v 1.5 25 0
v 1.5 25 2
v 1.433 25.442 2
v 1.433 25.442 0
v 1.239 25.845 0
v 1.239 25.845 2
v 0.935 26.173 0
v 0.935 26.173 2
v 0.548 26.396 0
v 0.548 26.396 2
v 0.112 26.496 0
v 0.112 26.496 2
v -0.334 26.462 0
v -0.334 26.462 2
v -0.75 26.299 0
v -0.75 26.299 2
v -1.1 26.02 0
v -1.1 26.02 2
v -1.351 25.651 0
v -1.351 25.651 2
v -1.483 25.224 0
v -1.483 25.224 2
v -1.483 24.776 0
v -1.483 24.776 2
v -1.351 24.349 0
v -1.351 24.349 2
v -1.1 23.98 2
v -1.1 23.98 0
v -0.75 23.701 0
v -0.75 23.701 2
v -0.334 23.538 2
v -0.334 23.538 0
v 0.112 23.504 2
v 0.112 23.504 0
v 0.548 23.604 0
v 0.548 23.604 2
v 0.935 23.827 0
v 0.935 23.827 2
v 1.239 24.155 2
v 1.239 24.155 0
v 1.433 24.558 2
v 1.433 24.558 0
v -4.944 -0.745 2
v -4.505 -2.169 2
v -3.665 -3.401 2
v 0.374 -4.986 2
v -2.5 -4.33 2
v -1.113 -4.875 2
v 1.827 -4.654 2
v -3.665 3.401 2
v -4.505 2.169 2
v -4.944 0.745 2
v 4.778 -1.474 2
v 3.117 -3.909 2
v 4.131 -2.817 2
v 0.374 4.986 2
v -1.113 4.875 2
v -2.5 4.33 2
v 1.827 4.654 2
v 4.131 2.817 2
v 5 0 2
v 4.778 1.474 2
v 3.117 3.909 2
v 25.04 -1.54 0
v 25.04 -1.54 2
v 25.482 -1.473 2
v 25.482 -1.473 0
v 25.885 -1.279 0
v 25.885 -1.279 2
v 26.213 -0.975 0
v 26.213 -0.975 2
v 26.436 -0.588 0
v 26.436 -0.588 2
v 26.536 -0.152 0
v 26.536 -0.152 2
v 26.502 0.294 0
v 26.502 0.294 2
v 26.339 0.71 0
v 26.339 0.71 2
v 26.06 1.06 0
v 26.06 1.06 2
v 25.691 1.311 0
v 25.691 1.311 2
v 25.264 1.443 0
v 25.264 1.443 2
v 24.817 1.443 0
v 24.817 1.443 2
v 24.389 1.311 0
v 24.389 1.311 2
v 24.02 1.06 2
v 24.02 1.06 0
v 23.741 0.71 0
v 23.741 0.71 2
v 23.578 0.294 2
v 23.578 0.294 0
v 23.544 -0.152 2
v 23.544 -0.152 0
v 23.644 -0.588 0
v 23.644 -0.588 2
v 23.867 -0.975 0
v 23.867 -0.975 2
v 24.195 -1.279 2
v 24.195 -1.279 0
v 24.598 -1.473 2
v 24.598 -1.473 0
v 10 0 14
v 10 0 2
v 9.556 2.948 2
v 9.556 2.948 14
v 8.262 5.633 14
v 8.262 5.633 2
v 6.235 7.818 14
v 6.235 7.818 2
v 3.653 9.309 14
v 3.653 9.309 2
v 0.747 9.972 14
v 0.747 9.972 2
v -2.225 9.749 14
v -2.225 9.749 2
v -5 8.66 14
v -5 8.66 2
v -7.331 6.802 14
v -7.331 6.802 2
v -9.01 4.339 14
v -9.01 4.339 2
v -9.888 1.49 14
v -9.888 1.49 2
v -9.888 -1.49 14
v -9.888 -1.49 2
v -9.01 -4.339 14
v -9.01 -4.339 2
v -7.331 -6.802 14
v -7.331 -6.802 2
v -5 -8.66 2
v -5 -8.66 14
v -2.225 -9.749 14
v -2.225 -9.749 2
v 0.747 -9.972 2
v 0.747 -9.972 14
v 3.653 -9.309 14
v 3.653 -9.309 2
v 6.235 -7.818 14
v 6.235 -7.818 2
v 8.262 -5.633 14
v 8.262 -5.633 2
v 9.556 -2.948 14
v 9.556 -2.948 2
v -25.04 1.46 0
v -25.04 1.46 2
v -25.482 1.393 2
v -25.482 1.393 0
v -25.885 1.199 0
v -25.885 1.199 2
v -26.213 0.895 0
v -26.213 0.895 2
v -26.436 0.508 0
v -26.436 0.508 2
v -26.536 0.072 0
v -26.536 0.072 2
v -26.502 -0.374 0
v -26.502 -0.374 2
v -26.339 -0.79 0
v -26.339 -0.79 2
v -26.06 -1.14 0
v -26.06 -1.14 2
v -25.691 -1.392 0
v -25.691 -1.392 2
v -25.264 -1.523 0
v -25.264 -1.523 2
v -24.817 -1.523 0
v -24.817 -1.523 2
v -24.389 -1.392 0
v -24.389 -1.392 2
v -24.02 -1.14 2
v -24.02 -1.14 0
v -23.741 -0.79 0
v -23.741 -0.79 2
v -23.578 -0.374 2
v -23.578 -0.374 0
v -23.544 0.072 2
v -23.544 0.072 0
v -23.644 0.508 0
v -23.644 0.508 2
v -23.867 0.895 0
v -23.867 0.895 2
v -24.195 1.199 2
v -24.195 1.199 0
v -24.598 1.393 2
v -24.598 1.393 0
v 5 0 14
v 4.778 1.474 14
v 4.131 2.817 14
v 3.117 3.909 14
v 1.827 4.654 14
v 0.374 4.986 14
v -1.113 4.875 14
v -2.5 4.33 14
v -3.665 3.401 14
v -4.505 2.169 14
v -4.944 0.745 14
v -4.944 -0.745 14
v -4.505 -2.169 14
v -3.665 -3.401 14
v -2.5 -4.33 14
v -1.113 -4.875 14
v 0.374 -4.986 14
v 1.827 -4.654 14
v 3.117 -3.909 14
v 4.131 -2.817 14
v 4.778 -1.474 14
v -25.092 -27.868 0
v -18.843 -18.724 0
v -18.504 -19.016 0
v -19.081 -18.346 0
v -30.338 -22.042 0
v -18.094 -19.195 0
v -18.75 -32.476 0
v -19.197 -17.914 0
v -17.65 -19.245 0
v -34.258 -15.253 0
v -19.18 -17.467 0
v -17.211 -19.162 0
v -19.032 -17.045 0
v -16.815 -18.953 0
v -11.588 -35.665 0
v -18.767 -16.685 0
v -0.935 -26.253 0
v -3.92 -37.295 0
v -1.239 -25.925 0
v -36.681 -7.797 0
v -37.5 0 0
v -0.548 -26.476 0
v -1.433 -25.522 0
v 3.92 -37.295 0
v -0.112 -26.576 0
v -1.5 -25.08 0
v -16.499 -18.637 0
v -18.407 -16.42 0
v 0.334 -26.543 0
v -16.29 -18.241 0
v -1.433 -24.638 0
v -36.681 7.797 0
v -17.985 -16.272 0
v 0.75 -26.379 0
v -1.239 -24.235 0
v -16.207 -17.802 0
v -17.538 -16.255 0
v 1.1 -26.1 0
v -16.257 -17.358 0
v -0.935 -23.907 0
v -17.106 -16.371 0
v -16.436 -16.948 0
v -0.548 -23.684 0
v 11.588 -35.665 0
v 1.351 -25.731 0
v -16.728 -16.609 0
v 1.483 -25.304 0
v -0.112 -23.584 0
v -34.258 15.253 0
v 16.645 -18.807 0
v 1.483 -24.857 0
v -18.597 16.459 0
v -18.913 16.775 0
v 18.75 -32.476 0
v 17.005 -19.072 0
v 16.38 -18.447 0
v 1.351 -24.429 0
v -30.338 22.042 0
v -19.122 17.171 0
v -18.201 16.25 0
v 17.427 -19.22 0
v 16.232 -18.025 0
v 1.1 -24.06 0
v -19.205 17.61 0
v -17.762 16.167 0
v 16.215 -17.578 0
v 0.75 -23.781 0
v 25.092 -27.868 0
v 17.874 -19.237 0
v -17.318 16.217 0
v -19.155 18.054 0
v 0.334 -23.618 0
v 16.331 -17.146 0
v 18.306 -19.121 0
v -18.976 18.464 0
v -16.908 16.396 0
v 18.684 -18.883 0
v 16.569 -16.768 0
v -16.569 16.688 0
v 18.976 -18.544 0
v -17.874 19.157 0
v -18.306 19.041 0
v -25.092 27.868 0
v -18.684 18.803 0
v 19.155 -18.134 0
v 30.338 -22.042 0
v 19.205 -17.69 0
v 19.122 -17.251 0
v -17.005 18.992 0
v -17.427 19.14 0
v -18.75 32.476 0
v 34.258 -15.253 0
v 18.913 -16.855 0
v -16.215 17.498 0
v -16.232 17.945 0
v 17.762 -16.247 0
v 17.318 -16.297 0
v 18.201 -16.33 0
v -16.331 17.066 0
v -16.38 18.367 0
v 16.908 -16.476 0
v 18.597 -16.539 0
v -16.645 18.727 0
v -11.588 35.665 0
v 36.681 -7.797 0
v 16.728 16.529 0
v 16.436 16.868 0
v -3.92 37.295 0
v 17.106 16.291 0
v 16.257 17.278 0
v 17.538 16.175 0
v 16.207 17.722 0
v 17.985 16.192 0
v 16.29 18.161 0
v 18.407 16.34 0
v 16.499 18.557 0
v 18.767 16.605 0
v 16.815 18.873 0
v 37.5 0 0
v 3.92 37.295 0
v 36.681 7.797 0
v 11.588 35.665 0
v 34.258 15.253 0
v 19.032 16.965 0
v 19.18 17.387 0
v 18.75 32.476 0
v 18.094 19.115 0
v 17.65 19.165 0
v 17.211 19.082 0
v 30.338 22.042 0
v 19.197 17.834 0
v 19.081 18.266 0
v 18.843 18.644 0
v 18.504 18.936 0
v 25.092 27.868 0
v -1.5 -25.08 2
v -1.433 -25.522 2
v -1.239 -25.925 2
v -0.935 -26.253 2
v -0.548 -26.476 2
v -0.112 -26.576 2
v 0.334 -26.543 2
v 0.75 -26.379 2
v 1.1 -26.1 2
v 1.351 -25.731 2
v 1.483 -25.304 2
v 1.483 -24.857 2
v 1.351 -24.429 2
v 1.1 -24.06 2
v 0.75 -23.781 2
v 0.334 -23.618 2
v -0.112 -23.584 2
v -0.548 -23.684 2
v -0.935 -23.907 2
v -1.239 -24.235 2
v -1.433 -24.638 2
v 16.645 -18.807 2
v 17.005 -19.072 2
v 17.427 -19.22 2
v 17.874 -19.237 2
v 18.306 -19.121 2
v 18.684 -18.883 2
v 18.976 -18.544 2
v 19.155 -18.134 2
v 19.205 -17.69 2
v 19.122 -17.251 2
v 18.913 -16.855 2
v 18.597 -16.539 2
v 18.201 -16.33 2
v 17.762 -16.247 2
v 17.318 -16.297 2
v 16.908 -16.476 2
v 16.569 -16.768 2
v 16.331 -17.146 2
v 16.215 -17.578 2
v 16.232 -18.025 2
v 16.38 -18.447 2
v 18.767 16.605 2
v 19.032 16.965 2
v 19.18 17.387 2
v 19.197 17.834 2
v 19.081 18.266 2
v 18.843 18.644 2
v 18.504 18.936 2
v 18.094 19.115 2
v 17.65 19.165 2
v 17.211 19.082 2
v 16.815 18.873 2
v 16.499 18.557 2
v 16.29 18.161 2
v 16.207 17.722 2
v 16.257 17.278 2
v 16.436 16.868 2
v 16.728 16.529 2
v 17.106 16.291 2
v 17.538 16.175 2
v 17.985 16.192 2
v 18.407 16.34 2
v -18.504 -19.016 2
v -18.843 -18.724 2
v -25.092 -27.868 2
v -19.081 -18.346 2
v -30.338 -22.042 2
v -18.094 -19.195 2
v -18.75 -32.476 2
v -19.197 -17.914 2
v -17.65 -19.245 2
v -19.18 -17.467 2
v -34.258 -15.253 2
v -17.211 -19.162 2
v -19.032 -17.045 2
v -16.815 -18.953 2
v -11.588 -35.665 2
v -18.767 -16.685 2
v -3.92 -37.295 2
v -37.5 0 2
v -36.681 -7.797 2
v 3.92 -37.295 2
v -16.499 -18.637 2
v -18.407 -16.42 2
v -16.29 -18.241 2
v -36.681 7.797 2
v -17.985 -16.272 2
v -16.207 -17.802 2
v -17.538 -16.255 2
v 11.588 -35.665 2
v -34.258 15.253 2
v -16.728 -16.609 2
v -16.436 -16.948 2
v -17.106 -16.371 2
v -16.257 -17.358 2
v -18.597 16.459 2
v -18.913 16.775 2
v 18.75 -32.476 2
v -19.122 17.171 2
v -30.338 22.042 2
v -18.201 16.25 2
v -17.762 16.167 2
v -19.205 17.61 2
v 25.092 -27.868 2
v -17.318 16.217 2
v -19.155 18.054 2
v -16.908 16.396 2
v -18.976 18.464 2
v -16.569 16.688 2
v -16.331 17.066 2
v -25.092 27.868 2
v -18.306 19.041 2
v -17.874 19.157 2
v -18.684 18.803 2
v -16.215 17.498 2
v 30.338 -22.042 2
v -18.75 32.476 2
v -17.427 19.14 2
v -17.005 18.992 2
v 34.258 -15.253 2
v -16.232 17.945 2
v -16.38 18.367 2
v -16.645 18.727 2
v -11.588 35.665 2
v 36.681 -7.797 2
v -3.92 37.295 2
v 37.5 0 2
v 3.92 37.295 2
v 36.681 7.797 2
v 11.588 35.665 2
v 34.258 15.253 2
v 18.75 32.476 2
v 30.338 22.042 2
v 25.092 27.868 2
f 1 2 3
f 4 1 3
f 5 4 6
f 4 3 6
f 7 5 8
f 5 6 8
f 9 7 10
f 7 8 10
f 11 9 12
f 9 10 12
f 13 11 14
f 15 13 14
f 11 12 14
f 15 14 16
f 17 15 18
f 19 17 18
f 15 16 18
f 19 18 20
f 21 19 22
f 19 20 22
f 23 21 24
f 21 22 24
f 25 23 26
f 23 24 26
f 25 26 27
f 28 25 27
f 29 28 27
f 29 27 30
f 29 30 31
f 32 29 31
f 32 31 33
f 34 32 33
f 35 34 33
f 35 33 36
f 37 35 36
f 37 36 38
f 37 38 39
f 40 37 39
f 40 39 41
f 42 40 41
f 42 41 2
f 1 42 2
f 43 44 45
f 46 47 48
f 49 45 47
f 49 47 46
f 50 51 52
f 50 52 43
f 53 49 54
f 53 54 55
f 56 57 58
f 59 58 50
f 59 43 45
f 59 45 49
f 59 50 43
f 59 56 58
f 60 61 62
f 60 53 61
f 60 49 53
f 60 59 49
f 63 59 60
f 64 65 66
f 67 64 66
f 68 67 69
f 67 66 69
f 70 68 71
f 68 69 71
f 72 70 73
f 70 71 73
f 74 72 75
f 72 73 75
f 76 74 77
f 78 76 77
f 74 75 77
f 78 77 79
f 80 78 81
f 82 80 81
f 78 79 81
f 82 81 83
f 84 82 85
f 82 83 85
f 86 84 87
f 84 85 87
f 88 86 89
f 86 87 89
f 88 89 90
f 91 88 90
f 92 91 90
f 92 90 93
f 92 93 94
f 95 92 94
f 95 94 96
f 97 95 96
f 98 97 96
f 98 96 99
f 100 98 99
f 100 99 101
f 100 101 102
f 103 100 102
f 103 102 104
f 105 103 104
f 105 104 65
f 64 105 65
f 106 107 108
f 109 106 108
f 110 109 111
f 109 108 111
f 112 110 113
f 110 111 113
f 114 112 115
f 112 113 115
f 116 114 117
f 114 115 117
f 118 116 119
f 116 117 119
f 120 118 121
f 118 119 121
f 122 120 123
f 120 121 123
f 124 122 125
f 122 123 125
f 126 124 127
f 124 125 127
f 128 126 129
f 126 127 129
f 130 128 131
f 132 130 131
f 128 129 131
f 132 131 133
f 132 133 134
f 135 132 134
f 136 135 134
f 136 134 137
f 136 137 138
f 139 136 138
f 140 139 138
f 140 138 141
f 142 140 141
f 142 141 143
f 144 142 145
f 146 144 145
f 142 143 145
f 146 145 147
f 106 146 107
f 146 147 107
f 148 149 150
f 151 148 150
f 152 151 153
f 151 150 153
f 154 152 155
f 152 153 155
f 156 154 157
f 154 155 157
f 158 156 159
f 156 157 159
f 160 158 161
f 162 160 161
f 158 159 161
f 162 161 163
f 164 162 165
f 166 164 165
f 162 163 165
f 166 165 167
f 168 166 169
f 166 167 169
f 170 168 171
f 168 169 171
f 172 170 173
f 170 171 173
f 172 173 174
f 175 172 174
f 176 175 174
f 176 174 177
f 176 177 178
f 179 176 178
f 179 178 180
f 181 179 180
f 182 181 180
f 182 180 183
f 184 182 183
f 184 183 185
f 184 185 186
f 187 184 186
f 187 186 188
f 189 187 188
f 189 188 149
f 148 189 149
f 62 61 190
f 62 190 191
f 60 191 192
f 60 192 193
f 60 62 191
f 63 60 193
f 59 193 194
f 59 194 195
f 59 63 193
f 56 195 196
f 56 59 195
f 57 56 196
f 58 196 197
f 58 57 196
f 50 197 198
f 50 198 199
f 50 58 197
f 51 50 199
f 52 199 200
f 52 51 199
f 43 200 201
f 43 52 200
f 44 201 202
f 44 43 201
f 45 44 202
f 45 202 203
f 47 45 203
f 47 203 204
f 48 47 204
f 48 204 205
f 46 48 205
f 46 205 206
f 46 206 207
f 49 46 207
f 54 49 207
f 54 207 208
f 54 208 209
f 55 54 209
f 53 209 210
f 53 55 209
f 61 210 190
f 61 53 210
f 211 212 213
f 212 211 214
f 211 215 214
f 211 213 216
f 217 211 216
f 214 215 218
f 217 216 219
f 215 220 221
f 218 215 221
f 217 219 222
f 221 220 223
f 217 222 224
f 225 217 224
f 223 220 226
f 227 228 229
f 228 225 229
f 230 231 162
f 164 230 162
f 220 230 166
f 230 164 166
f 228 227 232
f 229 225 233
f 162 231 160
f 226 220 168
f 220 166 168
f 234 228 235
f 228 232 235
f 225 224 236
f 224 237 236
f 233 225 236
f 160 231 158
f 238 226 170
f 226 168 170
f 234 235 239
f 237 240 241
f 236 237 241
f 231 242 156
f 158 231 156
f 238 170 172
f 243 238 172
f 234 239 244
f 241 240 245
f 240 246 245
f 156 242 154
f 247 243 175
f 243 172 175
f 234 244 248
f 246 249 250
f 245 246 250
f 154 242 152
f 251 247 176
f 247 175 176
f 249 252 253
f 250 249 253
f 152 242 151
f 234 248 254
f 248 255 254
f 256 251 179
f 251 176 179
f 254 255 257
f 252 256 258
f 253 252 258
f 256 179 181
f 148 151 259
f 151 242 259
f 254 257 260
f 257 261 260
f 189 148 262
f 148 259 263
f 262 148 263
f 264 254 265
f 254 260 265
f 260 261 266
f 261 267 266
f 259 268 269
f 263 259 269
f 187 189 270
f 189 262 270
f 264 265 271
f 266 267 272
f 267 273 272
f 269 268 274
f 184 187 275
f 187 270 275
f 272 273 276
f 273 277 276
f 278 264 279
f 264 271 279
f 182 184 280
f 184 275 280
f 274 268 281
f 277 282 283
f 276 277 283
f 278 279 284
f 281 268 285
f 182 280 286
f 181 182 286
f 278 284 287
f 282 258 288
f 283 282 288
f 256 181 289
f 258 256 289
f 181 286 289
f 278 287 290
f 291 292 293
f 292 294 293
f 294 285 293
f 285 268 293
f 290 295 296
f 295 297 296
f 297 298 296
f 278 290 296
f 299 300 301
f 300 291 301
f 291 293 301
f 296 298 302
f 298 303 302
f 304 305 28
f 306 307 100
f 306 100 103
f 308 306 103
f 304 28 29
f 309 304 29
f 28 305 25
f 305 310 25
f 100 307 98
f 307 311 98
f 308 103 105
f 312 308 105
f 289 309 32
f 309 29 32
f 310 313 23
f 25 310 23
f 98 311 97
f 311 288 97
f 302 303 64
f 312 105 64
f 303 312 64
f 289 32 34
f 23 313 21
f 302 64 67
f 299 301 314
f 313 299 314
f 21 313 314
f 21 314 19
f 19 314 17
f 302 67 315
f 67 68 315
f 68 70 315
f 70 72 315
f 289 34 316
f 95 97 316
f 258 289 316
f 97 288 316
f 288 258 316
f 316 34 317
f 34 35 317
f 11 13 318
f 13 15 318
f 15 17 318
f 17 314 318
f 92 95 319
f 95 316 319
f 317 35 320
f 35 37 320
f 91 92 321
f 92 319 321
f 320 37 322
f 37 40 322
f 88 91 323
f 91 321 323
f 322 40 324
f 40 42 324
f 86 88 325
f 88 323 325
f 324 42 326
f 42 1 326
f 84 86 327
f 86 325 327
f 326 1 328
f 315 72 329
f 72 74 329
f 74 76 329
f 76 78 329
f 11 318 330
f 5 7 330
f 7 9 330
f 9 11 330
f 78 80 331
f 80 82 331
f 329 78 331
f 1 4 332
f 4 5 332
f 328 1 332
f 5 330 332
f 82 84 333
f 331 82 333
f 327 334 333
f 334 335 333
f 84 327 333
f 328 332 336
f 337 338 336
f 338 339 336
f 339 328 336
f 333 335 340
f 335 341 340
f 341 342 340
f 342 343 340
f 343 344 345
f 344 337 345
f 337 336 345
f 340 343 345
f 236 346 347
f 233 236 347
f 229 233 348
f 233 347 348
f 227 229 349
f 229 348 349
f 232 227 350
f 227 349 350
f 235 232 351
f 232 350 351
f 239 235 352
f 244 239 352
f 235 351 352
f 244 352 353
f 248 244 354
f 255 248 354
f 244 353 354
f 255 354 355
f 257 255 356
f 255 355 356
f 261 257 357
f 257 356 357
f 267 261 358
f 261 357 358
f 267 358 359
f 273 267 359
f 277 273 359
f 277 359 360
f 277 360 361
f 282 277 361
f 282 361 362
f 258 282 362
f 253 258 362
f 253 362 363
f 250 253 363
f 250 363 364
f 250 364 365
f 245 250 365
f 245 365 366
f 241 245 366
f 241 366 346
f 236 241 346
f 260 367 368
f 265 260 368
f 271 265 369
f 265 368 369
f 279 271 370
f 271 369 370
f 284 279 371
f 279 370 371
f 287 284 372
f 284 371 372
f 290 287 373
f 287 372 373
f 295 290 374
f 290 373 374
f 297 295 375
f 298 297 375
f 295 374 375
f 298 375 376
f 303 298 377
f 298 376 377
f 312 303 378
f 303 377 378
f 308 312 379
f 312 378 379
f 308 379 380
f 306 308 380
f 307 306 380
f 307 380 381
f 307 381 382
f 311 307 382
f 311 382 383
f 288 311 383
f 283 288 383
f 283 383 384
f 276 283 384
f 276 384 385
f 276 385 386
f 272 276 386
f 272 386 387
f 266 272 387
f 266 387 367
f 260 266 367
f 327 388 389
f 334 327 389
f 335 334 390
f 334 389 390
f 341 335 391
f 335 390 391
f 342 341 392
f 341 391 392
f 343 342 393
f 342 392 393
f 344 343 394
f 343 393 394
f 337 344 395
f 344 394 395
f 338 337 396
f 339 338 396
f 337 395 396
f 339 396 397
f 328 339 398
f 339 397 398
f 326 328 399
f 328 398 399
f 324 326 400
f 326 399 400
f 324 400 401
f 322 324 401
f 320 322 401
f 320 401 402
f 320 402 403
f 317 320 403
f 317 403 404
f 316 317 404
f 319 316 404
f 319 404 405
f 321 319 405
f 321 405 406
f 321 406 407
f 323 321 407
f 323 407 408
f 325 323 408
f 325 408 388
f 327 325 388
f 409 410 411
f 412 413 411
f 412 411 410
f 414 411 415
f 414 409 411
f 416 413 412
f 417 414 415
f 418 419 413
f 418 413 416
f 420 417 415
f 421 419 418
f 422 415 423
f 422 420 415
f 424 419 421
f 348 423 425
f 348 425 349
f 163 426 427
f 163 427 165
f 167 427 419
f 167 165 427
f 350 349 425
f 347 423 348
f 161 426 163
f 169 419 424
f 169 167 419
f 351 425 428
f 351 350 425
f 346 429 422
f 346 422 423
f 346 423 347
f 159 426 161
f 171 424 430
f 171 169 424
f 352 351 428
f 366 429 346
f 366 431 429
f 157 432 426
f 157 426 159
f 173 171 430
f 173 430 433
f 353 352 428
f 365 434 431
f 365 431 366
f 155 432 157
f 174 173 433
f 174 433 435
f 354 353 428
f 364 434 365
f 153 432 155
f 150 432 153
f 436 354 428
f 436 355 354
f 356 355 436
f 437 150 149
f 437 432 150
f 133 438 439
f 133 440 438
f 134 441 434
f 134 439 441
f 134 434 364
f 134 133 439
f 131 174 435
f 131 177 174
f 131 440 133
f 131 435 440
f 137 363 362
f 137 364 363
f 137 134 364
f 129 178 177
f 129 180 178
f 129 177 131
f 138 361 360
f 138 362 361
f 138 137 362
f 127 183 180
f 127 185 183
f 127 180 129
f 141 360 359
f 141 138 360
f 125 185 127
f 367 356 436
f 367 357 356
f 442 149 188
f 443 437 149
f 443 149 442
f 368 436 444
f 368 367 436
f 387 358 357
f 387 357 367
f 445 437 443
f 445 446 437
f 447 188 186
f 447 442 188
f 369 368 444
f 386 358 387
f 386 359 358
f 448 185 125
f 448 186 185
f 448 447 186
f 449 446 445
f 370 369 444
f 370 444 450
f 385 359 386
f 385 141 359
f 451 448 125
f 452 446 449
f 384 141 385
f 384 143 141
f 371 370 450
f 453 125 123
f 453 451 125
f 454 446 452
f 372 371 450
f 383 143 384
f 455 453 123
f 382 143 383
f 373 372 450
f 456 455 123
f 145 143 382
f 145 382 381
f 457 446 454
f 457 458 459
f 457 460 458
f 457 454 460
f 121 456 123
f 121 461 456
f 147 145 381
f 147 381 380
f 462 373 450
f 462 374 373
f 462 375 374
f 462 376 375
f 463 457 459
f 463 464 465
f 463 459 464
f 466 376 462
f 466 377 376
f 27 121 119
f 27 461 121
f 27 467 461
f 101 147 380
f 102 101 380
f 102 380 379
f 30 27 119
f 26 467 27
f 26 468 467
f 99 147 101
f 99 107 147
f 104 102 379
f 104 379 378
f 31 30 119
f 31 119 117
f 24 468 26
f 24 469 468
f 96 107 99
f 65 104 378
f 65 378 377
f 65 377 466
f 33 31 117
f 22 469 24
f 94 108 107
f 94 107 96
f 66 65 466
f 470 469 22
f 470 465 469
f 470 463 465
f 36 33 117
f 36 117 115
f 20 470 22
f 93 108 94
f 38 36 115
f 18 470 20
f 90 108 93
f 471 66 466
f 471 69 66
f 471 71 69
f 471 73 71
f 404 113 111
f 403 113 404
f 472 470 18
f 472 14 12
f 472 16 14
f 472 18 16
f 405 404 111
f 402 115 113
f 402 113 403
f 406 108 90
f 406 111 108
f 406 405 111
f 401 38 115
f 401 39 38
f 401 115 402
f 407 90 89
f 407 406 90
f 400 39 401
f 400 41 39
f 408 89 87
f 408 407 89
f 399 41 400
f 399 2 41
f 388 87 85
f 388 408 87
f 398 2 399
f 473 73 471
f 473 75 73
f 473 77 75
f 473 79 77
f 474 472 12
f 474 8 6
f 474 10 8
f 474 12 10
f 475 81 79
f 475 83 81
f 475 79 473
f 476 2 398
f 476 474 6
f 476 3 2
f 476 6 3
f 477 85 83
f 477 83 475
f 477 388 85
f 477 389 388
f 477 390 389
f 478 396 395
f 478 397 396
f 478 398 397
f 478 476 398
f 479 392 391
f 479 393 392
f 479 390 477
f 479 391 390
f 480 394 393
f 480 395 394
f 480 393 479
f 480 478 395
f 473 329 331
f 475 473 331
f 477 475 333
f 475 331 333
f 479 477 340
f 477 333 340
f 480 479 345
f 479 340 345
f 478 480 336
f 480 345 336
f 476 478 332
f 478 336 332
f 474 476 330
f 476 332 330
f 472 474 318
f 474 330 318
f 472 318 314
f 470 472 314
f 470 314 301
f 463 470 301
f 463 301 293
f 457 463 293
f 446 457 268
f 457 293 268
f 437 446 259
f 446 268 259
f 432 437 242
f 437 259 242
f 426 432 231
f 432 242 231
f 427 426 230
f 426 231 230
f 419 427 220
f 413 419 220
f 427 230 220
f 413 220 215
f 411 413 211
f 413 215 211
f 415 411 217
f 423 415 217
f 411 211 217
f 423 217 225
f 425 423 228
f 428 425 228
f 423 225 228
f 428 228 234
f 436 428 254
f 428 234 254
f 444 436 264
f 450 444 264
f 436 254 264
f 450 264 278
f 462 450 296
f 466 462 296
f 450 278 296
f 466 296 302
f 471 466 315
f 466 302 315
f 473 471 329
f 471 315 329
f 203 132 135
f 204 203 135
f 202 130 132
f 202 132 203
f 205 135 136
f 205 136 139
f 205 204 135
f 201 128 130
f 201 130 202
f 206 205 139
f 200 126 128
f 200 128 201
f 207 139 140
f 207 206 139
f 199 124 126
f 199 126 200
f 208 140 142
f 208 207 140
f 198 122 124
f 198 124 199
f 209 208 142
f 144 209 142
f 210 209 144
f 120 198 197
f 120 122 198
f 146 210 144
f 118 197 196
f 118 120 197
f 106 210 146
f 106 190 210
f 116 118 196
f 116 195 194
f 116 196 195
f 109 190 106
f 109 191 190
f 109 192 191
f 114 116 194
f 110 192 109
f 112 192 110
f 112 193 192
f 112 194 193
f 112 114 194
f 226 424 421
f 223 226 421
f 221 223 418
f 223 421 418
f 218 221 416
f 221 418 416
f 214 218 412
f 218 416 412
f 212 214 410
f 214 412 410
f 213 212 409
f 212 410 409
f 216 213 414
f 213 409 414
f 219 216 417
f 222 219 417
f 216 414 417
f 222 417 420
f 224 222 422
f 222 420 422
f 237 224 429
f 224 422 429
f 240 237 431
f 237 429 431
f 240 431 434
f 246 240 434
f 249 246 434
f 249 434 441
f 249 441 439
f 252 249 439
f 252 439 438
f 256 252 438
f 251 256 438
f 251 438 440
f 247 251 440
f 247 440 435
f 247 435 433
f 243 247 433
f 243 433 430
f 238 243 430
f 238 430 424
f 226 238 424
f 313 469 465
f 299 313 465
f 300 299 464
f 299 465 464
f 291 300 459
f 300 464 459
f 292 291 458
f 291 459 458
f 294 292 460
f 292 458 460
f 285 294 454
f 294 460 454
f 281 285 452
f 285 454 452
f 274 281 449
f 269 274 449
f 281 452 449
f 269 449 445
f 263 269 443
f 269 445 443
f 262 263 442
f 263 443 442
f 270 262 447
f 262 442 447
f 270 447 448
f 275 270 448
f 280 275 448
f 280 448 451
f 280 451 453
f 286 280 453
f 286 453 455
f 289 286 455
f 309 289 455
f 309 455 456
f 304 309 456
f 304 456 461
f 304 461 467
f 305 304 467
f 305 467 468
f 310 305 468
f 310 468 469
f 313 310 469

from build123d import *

# Parameters (mm, degrees)
SKETCH1_R           = 37.5
BOSS_EXTRUDE1_DEPTH = 2
SKETCH2_R           = 1.5
CUT_EXTRUDE1_DEPTH  = 10
CIRPATTERN1_COUNT   = 8
SKETCH3_R           = 10
SKETCH3_R_2         = 5
BOSS_EXTRUDE2_DEPTH = 12


with BuildPart() as part:
    # Sketch1 → Boss-Extrude1 (new body)
    with BuildSketch(Plane.XY):
        Circle(SKETCH1_R)
    extrude(amount=BOSS_EXTRUDE1_DEPTH)

    # Sketch2 → Cut-Extrude1 (cut)
    with BuildSketch(Plane.XY.offset(2)):
        with Locations((0, 25)):
            Circle(SKETCH2_R)
    cut_extrude1 = extrude(amount=-CUT_EXTRUDE1_DEPTH, mode=Mode.SUBTRACT)

    # CirPattern1: Cut-Extrude1 ×8 about axis
    cirpattern1_axis = Axis((0, -0.040064103, 0), (0, 0, 1))
    for i in range(1, CIRPATTERN1_COUNT):
        add(cut_extrude1.rotate(cirpattern1_axis, i * 360 / CIRPATTERN1_COUNT), mode=Mode.SUBTRACT)

    # Sketch3 → Boss-Extrude2 (add)
    with BuildSketch(Plane.XY.offset(2)):
        Circle(SKETCH3_R)
        Circle(SKETCH3_R_2, mode=Mode.SUBTRACT)
    extrude(amount=BOSS_EXTRUDE2_DEPTH)


solid = part.part
